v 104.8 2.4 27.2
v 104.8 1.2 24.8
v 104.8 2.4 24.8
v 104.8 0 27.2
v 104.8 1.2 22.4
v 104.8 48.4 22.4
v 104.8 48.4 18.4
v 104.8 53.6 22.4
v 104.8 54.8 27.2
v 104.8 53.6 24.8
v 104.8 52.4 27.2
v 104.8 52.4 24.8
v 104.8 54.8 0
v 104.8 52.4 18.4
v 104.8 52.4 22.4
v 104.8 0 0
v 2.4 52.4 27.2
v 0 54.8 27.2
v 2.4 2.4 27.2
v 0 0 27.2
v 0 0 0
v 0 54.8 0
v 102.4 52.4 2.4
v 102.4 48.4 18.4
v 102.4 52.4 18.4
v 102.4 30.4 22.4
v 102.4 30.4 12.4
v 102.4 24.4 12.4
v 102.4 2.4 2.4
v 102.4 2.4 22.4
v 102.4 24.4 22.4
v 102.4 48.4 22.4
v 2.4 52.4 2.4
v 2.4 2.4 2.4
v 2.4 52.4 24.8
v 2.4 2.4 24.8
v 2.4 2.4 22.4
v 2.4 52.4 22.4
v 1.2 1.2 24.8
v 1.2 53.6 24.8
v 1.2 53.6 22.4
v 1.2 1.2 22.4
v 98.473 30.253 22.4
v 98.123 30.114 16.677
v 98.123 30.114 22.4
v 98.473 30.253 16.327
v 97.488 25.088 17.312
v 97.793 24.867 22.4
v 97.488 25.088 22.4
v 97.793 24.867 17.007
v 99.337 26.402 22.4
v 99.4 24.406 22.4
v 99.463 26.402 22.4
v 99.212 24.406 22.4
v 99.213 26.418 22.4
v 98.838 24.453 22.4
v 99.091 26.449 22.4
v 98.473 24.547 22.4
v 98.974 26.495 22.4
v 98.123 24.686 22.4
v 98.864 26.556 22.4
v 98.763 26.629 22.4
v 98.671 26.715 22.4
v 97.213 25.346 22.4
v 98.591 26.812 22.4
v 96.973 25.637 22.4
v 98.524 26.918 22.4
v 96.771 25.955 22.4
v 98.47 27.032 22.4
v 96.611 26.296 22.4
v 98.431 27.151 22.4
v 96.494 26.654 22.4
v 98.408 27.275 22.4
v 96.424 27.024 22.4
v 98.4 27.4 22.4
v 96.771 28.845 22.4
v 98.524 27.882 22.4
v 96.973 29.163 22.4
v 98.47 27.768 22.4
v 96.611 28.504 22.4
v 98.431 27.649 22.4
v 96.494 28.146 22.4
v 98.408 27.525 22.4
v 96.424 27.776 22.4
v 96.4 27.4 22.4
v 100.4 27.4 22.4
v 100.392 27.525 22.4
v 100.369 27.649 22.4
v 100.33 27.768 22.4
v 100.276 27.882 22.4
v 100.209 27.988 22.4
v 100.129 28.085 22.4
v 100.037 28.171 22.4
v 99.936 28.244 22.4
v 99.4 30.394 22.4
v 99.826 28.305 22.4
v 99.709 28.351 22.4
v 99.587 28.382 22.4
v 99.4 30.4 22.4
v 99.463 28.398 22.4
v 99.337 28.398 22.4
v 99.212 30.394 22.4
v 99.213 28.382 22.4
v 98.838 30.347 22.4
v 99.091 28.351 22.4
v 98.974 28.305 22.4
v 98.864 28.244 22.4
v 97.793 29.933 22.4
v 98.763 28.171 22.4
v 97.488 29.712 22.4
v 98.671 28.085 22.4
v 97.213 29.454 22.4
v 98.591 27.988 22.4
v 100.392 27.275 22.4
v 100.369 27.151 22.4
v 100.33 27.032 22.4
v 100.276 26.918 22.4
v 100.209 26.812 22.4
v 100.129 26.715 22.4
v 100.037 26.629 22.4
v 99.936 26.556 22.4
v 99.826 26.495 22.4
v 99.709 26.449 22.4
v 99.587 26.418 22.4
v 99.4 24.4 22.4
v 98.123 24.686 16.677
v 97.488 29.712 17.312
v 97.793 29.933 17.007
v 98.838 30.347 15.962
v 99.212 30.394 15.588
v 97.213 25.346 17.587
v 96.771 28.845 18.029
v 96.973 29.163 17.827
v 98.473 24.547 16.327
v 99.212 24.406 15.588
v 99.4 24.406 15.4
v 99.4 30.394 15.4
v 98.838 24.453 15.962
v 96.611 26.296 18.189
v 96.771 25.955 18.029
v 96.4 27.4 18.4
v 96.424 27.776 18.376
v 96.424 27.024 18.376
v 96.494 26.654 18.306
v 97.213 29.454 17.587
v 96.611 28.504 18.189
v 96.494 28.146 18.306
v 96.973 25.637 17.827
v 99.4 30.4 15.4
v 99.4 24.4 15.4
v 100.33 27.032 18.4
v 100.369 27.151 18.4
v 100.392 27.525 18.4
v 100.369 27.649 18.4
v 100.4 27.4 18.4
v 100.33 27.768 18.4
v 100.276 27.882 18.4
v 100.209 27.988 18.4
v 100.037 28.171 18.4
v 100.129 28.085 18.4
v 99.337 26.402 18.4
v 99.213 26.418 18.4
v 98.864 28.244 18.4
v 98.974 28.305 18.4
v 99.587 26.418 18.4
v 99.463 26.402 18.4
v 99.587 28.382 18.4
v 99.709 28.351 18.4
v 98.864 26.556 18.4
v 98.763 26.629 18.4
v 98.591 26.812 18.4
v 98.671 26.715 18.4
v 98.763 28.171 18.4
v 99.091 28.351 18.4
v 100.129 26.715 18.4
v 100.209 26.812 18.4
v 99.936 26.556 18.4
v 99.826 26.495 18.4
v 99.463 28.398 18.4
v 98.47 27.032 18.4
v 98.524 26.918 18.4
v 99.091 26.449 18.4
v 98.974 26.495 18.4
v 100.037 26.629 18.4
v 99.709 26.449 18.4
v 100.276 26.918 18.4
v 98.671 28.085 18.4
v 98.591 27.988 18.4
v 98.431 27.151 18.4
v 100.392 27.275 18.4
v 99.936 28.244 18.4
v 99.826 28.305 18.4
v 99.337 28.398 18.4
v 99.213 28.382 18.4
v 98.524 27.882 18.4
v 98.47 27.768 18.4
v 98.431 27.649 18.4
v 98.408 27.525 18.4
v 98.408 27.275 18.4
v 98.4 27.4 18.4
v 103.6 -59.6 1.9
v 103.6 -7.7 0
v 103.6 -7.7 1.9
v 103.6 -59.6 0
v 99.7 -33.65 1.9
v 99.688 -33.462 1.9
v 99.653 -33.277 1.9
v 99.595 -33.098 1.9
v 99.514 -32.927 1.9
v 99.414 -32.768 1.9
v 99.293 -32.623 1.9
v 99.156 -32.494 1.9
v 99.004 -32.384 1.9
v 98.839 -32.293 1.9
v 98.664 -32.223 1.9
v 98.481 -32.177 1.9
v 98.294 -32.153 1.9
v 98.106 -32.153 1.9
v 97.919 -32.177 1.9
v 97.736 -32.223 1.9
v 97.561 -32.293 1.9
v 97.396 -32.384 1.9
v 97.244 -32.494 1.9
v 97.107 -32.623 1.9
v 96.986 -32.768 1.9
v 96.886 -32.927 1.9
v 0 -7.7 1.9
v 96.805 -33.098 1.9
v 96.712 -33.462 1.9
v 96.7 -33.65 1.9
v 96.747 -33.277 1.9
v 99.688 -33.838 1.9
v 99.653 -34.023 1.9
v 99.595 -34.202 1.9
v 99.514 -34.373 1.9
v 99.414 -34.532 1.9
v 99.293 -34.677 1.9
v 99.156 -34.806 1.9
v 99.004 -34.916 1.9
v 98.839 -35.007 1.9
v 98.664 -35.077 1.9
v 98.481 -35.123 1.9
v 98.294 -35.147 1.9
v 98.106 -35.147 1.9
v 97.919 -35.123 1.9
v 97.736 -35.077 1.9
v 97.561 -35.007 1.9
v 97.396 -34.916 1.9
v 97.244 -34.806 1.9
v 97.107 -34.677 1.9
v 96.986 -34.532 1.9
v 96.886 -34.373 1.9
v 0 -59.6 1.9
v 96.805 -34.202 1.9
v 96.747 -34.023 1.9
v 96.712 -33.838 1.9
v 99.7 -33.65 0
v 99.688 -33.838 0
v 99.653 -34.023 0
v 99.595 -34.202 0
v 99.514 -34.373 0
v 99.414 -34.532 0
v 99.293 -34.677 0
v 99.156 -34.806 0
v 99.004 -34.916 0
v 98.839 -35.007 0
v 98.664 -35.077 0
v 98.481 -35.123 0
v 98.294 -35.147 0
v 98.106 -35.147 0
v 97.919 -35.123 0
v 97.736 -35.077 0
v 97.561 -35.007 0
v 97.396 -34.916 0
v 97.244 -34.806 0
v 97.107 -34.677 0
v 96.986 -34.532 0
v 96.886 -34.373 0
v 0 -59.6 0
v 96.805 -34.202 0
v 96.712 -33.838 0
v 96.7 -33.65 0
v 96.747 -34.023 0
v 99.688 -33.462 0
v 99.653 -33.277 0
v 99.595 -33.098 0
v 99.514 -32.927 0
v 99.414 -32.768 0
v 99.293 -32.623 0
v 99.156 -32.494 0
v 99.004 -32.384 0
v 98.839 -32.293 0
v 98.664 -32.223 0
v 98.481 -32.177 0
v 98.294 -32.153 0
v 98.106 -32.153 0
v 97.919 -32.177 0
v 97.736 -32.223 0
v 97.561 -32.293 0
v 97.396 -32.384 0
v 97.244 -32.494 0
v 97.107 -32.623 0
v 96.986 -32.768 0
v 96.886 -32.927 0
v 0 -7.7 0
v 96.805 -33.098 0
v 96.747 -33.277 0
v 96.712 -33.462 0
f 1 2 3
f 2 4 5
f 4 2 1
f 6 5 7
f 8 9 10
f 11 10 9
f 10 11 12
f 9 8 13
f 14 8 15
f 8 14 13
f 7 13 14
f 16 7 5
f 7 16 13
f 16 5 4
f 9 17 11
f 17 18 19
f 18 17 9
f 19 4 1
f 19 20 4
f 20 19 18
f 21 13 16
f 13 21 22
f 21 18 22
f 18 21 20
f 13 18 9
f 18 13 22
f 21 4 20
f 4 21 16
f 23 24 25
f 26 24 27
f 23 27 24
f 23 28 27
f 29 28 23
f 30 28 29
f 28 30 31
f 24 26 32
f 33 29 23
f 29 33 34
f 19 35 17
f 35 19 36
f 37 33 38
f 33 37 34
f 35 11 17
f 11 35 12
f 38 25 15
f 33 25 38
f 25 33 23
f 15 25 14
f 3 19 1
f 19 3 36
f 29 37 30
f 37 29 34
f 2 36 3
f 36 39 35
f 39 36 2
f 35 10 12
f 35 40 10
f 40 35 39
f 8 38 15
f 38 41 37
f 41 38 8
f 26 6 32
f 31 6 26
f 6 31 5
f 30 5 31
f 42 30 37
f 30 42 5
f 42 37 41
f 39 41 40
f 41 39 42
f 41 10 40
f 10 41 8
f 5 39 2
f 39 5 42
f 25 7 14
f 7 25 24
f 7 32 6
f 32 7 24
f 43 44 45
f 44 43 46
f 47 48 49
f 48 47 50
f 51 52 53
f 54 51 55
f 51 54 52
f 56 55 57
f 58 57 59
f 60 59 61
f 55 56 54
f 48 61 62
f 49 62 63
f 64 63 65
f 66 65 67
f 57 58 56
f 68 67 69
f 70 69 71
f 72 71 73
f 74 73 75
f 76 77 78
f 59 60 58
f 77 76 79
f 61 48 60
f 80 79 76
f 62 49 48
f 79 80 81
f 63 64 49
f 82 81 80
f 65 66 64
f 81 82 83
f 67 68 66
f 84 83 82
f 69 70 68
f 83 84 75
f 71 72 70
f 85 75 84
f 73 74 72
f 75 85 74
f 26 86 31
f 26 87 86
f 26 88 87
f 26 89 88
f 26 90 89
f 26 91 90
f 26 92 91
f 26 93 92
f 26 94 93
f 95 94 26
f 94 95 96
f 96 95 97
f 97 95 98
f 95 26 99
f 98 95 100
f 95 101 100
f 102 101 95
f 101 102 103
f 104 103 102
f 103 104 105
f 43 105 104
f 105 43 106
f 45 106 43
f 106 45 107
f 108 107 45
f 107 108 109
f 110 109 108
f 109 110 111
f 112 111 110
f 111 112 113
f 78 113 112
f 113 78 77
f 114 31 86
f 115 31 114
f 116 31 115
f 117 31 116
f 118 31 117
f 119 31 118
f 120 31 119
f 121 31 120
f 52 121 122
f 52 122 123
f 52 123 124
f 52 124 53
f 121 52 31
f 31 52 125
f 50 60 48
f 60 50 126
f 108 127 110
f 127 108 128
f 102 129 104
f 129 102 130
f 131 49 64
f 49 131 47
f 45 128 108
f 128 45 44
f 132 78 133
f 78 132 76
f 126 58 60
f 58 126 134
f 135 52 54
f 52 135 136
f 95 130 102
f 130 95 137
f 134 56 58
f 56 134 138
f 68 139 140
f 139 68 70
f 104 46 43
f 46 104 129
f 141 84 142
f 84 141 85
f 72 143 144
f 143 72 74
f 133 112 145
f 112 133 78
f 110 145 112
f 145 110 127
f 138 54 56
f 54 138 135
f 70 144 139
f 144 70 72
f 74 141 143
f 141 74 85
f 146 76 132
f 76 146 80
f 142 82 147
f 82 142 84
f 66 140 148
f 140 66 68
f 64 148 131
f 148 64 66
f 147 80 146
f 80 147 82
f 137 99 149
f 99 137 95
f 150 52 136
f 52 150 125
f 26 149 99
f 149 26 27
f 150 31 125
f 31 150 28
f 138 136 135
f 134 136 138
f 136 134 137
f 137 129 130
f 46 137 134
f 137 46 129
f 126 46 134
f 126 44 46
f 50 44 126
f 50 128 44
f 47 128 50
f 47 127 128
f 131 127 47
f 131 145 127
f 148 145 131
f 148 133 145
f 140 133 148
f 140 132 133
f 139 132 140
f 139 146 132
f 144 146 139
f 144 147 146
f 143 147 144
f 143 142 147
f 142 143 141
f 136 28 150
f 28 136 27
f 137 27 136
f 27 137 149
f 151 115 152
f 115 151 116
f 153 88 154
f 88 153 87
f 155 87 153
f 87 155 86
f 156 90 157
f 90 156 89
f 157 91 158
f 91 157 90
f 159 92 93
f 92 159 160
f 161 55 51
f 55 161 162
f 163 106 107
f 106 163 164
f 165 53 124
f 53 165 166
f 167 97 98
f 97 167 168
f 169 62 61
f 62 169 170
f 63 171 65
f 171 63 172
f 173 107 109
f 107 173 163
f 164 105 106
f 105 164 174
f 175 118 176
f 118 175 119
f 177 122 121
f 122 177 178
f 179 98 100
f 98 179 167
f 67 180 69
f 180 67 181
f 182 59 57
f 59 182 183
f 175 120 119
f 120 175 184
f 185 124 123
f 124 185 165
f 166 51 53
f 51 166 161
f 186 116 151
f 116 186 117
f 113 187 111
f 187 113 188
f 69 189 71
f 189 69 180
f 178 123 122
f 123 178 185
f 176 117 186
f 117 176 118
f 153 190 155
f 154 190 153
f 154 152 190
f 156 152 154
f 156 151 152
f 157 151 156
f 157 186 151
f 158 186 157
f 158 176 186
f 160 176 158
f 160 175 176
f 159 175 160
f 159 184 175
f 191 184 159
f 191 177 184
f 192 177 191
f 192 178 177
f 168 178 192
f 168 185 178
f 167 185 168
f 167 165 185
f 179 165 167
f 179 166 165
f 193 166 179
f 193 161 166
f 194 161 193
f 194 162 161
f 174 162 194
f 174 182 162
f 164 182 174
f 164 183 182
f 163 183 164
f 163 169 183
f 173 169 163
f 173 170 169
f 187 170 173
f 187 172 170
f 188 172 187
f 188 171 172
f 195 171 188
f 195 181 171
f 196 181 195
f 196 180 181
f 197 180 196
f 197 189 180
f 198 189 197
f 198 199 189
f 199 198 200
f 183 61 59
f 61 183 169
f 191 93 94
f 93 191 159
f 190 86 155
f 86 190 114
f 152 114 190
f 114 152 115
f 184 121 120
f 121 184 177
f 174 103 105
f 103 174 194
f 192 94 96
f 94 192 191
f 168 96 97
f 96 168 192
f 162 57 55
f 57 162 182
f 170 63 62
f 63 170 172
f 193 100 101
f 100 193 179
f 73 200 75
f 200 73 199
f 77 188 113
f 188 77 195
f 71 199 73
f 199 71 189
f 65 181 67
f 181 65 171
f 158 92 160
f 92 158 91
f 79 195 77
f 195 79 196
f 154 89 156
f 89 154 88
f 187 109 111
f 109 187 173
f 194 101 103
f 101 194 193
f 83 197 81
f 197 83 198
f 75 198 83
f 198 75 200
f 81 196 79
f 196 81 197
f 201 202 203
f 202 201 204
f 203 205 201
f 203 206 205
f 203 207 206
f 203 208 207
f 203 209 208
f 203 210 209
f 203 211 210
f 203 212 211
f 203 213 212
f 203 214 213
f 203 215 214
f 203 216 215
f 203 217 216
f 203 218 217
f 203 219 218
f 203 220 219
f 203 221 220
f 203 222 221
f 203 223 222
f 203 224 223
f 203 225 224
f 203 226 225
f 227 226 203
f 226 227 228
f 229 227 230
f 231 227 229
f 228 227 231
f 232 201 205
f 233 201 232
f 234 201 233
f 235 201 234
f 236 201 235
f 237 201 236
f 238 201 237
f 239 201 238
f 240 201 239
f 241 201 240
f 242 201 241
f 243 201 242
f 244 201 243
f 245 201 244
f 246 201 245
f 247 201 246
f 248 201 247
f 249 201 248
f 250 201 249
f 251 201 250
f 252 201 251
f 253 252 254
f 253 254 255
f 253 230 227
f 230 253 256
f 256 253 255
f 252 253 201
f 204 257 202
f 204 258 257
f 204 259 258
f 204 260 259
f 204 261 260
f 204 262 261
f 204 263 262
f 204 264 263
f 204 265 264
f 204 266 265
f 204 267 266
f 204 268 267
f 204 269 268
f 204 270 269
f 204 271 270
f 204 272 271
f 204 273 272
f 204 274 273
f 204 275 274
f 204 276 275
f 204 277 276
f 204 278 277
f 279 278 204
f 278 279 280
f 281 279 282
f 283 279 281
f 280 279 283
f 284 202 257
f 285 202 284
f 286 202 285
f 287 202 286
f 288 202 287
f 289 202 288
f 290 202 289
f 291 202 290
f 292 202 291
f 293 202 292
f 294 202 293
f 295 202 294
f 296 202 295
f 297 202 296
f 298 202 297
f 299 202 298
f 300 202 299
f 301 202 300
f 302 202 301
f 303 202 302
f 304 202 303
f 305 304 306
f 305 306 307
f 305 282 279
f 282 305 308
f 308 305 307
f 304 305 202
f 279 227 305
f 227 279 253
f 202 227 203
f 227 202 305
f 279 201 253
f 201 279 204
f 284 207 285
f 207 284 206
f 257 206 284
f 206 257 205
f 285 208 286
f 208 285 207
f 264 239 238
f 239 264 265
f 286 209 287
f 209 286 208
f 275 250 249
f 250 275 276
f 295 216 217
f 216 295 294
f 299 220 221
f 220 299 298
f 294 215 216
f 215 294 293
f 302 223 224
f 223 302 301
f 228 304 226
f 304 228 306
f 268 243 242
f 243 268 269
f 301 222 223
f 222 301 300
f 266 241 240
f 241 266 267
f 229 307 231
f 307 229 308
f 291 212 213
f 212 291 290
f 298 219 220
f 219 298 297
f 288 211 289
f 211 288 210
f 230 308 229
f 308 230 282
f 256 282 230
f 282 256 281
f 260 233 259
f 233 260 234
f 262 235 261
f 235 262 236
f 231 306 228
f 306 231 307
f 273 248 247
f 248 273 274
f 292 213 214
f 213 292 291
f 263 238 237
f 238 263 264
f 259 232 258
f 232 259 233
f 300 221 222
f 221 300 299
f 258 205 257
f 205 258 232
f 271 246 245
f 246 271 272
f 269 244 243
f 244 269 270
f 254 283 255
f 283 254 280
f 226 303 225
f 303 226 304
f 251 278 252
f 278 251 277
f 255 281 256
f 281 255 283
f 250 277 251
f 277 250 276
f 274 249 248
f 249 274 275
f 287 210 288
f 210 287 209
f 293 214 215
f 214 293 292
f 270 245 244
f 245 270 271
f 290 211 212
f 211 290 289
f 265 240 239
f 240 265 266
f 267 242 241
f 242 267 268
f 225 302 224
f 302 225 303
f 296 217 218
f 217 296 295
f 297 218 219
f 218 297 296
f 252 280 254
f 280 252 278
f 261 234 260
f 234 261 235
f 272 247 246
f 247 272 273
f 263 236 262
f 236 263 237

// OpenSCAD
//
// Project Box
// Copyright (C) 2021 Nils Weber
//
// Licensed under the MIT License
//

////////////////////////////////////////////////////////////////////////////////

/* [Dimensions] */

// Base Width
Width = 100;

// Base Depth
Depth = 50;

// Box Height
Height = 20;

/* [Screw] */

// Screw diameter
Screw_Diameter = 2;

// Screw length
Screw_Length = 4;

// Diameter of the lid hole (should be larger than Screw Diameter)
Hole_Diameter = 3;

// Thickness of the screw terminal
Terminal_Wall_Thickness = 2;

/* [Hole] */

// Offset between right wall and hole
Hole_Position = 0;

// Width of the hole
Hole_Width = 4;

// Height of the hole
Hole_Height = 4;

/* [Standoffs] */

// Whether or not to render standoffs for PCBs
Use_Standoffs = false;

// Distance between standoffs in X direction
Standoff_Length = 30;

// Distance between standoffs in Y direction
Standoff_Width = 20;

// Alignment of the standoffs on the X axis
Standoff_Alignment_X = "L"; // [T:Top, M:Middle, B:Bottom]

// Alignment of the standoffs on the Y axis
Standoff_Alignment_Y = "L"; // [L:Left, C:Center, R:Right]

// Distance to move the standoffs from their alignment position
Standoff_Offset = [0, 0];

// Height of the standoffs
Standoff_Height = 5;

// Screw diameter used to screw into the standoffs
Standoff_Screw_Diameter = 2;

// Length of the screw used to screw into the standoffs
Standoff_Screw_Length = 4;

// Thickness of the standoff walls
Standoff_Wall_Thickness = 2;


/* [Quality] */

// Thickness of outer walls and lid
Wall_Thickness = 2.4;

// Percentage to shrink the lid to be able to slide the lid
Tolerance = 0.5;

/* [Hidden] */

////////////////////////////////////////////////////////////////////////////////

$fn = 50;
width_outer = Width + Wall_Thickness * 2;
height_outer = Height + Wall_Thickness * 3;
depth_outer = Depth + Wall_Thickness * 2;

/*
module fillet_cube(dimensions, radius=1) {
	width = dimensions[0];
	depth = dimensions[1];
	height = dimensions[2];

	hull() {
		translate([0, 0, 0])
			cylinder(h=height, r=radius);
		translate([width + radius, 0, 0])
			cylinder(h=height, r=radius);
		translate([width + radius, depth + radius, 0])
			cylinder(h=height, r=radius);
		translate([0, depth + radius, 0])
			cylinder(h=height, r=radius);
	}
}
*/

terminal_diameter = Screw_Diameter + Terminal_Wall_Thickness*2;
terminal_height = Screw_Length + Terminal_Wall_Thickness*2;

difference() {
	union() {
		difference() {
			// Base
			cube([width_outer, depth_outer, height_outer]);

			// Cutout inside
			translate([Wall_Thickness, Wall_Thickness, Wall_Thickness])
				cube([Width, Depth, Height + Wall_Thickness * 2]);

			// Cutout lid

			translate([Wall_Thickness/2, Wall_Thickness/2, Wall_Thickness + Height])
				cube([Width + Wall_Thickness * 1.5, Depth + Wall_Thickness, Wall_Thickness]);
			/* translate([Wall_Thickness/2, Wall_Thickness/2, Wall_Thickness*2 + Height]) */
			/* 	cube([Width + Wall_Thickness * 1.5, Depth + Wall_Thickness, Wall_Thickness*2]); */

			// Cutout lid opening
			translate([Width + Wall_Thickness, Wall_Thickness, Height + Wall_Thickness * 2])
				cube([Wall_Thickness, Depth, Wall_Thickness]);
		}

	}

	translate([Width + Wall_Thickness, Depth + Wall_Thickness - Hole_Width - Hole_Position, Height + Wall_Thickness - Hole_Height])
		#cube([Wall_Thickness, Hole_Width, Hole_Height]);
}


translate([Width + Wall_Thickness, depth_outer/2, Height + Wall_Thickness])
	screw_terminal();

module screw_terminal() {
	module outline(height=Screw_Length) {
		union() {
			translate([0, terminal_diameter/2, 0])
				cylinder(h=height, d=terminal_diameter);
			translate([0, 0, 0])
				cube([terminal_diameter/2, terminal_diameter, height]);
		}
	}

	translate([-Terminal_Wall_Thickness - Screw_Diameter/2, -terminal_diameter/2, -Screw_Length])
	difference() {
		intersection() {
			hull() {
				translate([-terminal_diameter/2, 0, 0])
					rotate(45, [0,1,0])
					cube([terminal_diameter + Terminal_Wall_Thickness*2, terminal_diameter, Terminal_Wall_Thickness]);
				outline();
			}

			translate([0, 0, -terminal_diameter])
				outline(Screw_Length + terminal_diameter);
		}

		// Screw hole
		translate([0, terminal_diameter/2, 0])
			cylinder(h=Screw_Length, d=Screw_Diameter);
	}
}

module lid() {
	lid_thickness = Wall_Thickness - Tolerance;
	lid_width = Width + Wall_Thickness/2 + Wall_Thickness;
	lid_length = (Depth + Wall_Thickness) - Tolerance;

	difference() {
		cube ([lid_width, lid_length, lid_thickness]);

		translate([lid_width - Hole_Diameter - Wall_Thickness, lid_length/2, 0])
			cylinder(h=lid_thickness, d=Hole_Diameter);
	}
}

// Position lid on top of box
// translate([Wall_Thickness/2, Wall_Thickness/2 + Tolerance/2, Height + Wall_Thickness])
translate([0, -Depth - Wall_Thickness*4, 0])
	lid();

// Standoffs //{{{

module standoff() {
	difference() {
		cylinder(h=Standoff_Height, d=Standoff_Screw_Diameter + Standoff_Wall_Thickness * 2);
		translate([0, 0, Standoff_Height-Standoff_Screw_Length])
			cylinder(h=Standoff_Screw_Length, d=Standoff_Screw_Diameter);
	}
}

module standoffs() {
	standoff();
	translate([Standoff_Length, 0, 0])	
		standoff();
	translate([0, Standoff_Width, 0])
		standoff();
	translate([Standoff_Length, Standoff_Width, 0])
		standoff();
}

if (Use_Standoffs) {
	standoff_pos_x =
		Standoff_Alignment_X == "T" ? Wall_Thickness + Standoff_Wall_Thickness + Standoff_Screw_Diameter/2 :
		Standoff_Alignment_X == "M" ? (Width + Wall_Thickness - Standoff_Length)/2 :
		Standoff_Alignment_X == "B" ? Width + Wall_Thickness - Standoff_Wall_Thickness - Standoff_Screw_Diameter/2 - Standoff_Length :
		0;

	standoff_pos_y =
		Standoff_Alignment_Y == "L" ? Wall_Thickness + Standoff_Wall_Thickness + Standoff_Screw_Diameter/2 :
		Standoff_Alignment_Y == "C" ? (Depth + Wall_Thickness - Standoff_Width)/2 :
		Standoff_Alignment_Y == "R" ? Depth + Wall_Thickness - Standoff_Wall_Thickness - Standoff_Screw_Diameter/2 - Standoff_Width :
		0;

	standoff_pos = [standoff_pos_x, standoff_pos_y] + Standoff_Offset;
	translate(concat(standoff_pos, [Wall_Thickness]))
		standoffs();
}

//}}}
